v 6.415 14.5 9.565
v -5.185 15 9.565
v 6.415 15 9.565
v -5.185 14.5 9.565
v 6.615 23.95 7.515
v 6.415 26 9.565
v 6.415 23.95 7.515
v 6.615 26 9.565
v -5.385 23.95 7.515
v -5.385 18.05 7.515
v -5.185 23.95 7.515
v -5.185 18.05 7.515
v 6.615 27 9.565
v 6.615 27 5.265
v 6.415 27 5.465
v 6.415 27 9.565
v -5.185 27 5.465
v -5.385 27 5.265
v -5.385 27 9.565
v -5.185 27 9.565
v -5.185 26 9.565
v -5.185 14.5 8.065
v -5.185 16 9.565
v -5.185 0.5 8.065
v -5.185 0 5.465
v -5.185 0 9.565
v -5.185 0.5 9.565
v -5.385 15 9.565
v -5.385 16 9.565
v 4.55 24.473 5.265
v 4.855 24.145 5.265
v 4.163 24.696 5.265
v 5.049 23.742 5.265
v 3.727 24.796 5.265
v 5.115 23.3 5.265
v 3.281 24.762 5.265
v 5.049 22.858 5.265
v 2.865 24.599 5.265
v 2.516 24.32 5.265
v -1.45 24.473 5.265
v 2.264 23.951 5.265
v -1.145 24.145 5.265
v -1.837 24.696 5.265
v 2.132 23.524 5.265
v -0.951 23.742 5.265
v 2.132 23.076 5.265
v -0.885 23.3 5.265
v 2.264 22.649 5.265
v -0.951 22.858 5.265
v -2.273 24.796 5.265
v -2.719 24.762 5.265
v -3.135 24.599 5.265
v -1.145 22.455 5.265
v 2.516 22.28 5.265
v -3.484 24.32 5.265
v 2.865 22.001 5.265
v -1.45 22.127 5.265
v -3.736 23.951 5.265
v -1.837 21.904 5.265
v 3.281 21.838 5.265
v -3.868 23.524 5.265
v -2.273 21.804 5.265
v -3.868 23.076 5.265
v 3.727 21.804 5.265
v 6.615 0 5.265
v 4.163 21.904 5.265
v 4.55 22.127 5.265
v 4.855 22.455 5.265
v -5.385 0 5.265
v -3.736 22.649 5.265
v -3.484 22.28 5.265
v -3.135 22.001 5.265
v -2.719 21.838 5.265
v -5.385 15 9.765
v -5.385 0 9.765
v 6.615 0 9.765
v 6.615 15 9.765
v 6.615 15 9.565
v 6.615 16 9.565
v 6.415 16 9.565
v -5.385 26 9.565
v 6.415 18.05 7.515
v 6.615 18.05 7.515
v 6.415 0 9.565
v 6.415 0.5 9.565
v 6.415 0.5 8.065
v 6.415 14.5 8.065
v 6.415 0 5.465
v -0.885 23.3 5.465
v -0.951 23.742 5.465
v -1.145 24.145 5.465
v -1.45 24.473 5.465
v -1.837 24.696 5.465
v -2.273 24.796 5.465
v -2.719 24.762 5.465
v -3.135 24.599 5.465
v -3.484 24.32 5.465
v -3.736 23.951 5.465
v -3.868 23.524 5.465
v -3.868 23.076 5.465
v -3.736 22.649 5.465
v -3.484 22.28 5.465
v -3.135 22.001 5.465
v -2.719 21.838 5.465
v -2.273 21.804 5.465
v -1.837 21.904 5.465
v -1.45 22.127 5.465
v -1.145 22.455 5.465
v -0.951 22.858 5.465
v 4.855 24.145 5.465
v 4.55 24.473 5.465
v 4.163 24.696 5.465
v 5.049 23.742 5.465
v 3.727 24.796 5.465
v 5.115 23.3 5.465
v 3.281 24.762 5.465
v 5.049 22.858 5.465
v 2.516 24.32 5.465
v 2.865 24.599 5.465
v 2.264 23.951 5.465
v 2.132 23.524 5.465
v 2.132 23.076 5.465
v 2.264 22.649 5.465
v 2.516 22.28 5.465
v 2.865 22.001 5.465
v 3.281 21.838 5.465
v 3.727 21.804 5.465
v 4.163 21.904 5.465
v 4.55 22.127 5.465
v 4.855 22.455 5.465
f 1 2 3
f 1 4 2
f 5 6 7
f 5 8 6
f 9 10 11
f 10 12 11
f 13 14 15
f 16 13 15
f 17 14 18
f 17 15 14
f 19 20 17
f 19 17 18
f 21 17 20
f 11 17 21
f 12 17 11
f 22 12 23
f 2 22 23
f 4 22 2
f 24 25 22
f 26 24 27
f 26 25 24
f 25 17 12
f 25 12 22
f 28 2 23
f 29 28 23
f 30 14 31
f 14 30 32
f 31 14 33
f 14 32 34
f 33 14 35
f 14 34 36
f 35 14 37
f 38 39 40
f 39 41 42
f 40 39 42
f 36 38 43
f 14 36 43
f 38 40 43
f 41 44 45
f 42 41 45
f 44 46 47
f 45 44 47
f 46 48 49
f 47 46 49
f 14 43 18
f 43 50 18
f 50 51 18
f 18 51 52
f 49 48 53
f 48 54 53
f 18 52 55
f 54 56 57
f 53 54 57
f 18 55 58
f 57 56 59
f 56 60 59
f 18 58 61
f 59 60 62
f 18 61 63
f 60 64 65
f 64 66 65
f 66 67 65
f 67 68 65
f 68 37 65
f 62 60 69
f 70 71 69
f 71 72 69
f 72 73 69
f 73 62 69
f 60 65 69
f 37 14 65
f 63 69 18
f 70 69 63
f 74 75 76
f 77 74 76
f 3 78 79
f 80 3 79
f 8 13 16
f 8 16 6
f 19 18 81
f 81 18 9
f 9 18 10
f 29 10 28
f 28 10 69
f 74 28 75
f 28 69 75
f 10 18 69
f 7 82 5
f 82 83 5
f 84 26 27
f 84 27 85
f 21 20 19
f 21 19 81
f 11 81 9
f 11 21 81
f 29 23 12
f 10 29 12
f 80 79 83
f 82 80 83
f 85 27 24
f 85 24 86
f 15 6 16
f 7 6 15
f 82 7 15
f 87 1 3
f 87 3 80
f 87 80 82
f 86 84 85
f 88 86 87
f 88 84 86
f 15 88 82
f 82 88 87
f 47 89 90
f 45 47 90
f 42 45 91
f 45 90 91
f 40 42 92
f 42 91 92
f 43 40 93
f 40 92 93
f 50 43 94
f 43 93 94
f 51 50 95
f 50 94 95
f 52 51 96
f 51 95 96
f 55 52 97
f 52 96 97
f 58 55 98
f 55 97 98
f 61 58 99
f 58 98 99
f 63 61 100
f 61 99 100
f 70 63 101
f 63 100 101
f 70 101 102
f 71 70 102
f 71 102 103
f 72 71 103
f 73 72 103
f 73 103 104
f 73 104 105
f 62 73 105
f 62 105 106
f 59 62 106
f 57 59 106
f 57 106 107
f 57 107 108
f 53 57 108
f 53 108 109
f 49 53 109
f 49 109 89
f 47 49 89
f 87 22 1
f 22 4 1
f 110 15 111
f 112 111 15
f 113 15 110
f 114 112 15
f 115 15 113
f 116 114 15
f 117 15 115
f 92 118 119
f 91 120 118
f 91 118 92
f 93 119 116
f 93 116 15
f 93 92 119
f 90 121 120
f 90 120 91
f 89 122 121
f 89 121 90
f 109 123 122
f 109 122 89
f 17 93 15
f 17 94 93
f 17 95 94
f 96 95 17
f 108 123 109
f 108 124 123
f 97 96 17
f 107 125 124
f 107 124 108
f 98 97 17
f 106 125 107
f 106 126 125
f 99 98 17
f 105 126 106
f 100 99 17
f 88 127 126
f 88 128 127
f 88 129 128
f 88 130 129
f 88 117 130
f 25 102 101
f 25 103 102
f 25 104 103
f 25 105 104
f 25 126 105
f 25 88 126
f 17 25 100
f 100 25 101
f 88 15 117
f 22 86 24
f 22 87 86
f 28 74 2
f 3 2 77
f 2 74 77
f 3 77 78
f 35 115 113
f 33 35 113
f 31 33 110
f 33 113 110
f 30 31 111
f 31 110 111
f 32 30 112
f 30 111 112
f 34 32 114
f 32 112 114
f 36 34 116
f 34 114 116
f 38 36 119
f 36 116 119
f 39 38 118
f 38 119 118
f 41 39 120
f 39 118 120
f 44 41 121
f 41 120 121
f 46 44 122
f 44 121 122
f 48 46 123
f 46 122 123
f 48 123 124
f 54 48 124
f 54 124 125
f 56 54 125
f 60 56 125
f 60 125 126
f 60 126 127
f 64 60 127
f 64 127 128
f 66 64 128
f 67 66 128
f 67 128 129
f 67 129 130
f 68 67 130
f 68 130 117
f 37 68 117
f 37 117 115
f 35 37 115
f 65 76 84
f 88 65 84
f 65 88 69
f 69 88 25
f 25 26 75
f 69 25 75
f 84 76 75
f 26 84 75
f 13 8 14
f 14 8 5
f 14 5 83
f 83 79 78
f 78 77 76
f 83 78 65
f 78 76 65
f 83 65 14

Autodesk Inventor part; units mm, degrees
ref_plane "YZ Plane" through (0, 0, 0) normal (1, 0, 0) x (0, 1, 0)
ref_plane "XZ Plane" through (0, 0, 0) normal (0, 1, 0) x (-1, 0, 0)
ref_plane "XY Plane" through (0, 0, 0) normal (0, 0, 1) x (1, 0, 0)
sketch "Sketch1" plane through (0, 0, 0) normal (0, 1, 0) x (-1, 0, 0)
  line L0 (5.3848, 9.7652) -> (-6.6152, 9.7652)
  line L1 (-6.6152, 9.7652) -> (-6.6152, 5.2652)
  line L2 (-6.6152, 5.2652) -> (5.3848, 5.2652)
  line L3 (5.3848, 5.2652) -> (5.3848, 9.7652)
  point P0 (0, 0)
  dimension "d0" = 12
  dimension "d1" = 4.5
extrude "Extrusion1" add sketch "Sketch1" along normal blind 27
shell "Shell1" thickness 0.2 removed faces 2 at (2.6152, 27, 8.2652) at (2.6152, 0, 8.2652)
sketch "Sketch2" plane through (6.6152, 0, 9.7652) normal (1, 0, 0) x (0, 0, -1)
  line L0 (0, 0) -> (0, 27) projected
  line L1 (0, 27) -> (0, 15)
  line L2 (0, 15) -> (0.2, 15)
  line L3 (0.2, 15) -> (0.2, 16)
  line L4 (0, 27) -> (0.2, 27)
  line L5 (0.2, 27) -> (0.2, 26)
  line L6 (0.2, 27) -> (4.3, 27) projected
  line L7 (0.2, 26) -> (2.25, 23.95)
  line L8 (0.2, 16) -> (2.25, 18.05)
  line L9 (2.25, 18.05) -> (2.25, 23.95)
  line L10 (0, 0) -> (0, 27) projected
  point P0 (9.7652, 0)
  dimension "d5" = 12
  dimension "d6" = 0.2
  dimension "d7" = 1
  dimension "d9" = 1
  dimension "d12" = 2.05
  dimension "d15" = 2.05
  dimension "d16" = 5.9
  dimension "d17" = 2.05
extrude "Extrusion2" cut sketch "Sketch2" against normal up to next
sketch "Sketch3" plane through (-5.1848, 0, 5.4652) normal (0, 0, 1) x (1, 0, 0)
  circle A0 centre (2.8, 23.3) radius 1.5
  circle A1 centre (8.8, 23.3) radius 1.5
  line L0 (0, 27) -> (11.6, 27) projected
  line L1 (-0.2, 23.95) -> (-0.2, 26) projected
  line L2 (11.8, 26) -> (11.8, 23.95) projected
  point P0 (5.1848, 0)
  dimension "d20" = 3
  dimension "d21" = 3.7
  dimension "d22" = 3
  dimension "d23" = 3
extrude "Extrusion3" cut sketch "Sketch3" against normal up to next
sketch "Sketch4" plane through (0, 0, 0) normal (0, -1, 0) x (1, 0, 0)
  line L0 (-5.1848, 9.5652) -> (-5.3848, 9.5652) projected
  line L1 (-5.1848, 9.5652) -> (6.4152, 9.5652)
  line L2 (6.4152, 9.5652) -> (6.4152, 8.0652)
  line L3 (6.4152, 8.0652) -> (-5.1848, 8.0652)
  line L4 (-5.1848, 8.0652) -> (-5.1848, 9.5652)
  point P0 (0, 0)
  dimension "d26" = 11.6
  dimension "d27" = 1.5
extrude "Extrusion4" add sketch "Sketch4" along normal blind 1 and the other way blind 14.5
move faces "Move1" translate (0, 1.5, 0) faces at (-1.3181, -1, 9.0652)
properties part number "USB_Contact"
